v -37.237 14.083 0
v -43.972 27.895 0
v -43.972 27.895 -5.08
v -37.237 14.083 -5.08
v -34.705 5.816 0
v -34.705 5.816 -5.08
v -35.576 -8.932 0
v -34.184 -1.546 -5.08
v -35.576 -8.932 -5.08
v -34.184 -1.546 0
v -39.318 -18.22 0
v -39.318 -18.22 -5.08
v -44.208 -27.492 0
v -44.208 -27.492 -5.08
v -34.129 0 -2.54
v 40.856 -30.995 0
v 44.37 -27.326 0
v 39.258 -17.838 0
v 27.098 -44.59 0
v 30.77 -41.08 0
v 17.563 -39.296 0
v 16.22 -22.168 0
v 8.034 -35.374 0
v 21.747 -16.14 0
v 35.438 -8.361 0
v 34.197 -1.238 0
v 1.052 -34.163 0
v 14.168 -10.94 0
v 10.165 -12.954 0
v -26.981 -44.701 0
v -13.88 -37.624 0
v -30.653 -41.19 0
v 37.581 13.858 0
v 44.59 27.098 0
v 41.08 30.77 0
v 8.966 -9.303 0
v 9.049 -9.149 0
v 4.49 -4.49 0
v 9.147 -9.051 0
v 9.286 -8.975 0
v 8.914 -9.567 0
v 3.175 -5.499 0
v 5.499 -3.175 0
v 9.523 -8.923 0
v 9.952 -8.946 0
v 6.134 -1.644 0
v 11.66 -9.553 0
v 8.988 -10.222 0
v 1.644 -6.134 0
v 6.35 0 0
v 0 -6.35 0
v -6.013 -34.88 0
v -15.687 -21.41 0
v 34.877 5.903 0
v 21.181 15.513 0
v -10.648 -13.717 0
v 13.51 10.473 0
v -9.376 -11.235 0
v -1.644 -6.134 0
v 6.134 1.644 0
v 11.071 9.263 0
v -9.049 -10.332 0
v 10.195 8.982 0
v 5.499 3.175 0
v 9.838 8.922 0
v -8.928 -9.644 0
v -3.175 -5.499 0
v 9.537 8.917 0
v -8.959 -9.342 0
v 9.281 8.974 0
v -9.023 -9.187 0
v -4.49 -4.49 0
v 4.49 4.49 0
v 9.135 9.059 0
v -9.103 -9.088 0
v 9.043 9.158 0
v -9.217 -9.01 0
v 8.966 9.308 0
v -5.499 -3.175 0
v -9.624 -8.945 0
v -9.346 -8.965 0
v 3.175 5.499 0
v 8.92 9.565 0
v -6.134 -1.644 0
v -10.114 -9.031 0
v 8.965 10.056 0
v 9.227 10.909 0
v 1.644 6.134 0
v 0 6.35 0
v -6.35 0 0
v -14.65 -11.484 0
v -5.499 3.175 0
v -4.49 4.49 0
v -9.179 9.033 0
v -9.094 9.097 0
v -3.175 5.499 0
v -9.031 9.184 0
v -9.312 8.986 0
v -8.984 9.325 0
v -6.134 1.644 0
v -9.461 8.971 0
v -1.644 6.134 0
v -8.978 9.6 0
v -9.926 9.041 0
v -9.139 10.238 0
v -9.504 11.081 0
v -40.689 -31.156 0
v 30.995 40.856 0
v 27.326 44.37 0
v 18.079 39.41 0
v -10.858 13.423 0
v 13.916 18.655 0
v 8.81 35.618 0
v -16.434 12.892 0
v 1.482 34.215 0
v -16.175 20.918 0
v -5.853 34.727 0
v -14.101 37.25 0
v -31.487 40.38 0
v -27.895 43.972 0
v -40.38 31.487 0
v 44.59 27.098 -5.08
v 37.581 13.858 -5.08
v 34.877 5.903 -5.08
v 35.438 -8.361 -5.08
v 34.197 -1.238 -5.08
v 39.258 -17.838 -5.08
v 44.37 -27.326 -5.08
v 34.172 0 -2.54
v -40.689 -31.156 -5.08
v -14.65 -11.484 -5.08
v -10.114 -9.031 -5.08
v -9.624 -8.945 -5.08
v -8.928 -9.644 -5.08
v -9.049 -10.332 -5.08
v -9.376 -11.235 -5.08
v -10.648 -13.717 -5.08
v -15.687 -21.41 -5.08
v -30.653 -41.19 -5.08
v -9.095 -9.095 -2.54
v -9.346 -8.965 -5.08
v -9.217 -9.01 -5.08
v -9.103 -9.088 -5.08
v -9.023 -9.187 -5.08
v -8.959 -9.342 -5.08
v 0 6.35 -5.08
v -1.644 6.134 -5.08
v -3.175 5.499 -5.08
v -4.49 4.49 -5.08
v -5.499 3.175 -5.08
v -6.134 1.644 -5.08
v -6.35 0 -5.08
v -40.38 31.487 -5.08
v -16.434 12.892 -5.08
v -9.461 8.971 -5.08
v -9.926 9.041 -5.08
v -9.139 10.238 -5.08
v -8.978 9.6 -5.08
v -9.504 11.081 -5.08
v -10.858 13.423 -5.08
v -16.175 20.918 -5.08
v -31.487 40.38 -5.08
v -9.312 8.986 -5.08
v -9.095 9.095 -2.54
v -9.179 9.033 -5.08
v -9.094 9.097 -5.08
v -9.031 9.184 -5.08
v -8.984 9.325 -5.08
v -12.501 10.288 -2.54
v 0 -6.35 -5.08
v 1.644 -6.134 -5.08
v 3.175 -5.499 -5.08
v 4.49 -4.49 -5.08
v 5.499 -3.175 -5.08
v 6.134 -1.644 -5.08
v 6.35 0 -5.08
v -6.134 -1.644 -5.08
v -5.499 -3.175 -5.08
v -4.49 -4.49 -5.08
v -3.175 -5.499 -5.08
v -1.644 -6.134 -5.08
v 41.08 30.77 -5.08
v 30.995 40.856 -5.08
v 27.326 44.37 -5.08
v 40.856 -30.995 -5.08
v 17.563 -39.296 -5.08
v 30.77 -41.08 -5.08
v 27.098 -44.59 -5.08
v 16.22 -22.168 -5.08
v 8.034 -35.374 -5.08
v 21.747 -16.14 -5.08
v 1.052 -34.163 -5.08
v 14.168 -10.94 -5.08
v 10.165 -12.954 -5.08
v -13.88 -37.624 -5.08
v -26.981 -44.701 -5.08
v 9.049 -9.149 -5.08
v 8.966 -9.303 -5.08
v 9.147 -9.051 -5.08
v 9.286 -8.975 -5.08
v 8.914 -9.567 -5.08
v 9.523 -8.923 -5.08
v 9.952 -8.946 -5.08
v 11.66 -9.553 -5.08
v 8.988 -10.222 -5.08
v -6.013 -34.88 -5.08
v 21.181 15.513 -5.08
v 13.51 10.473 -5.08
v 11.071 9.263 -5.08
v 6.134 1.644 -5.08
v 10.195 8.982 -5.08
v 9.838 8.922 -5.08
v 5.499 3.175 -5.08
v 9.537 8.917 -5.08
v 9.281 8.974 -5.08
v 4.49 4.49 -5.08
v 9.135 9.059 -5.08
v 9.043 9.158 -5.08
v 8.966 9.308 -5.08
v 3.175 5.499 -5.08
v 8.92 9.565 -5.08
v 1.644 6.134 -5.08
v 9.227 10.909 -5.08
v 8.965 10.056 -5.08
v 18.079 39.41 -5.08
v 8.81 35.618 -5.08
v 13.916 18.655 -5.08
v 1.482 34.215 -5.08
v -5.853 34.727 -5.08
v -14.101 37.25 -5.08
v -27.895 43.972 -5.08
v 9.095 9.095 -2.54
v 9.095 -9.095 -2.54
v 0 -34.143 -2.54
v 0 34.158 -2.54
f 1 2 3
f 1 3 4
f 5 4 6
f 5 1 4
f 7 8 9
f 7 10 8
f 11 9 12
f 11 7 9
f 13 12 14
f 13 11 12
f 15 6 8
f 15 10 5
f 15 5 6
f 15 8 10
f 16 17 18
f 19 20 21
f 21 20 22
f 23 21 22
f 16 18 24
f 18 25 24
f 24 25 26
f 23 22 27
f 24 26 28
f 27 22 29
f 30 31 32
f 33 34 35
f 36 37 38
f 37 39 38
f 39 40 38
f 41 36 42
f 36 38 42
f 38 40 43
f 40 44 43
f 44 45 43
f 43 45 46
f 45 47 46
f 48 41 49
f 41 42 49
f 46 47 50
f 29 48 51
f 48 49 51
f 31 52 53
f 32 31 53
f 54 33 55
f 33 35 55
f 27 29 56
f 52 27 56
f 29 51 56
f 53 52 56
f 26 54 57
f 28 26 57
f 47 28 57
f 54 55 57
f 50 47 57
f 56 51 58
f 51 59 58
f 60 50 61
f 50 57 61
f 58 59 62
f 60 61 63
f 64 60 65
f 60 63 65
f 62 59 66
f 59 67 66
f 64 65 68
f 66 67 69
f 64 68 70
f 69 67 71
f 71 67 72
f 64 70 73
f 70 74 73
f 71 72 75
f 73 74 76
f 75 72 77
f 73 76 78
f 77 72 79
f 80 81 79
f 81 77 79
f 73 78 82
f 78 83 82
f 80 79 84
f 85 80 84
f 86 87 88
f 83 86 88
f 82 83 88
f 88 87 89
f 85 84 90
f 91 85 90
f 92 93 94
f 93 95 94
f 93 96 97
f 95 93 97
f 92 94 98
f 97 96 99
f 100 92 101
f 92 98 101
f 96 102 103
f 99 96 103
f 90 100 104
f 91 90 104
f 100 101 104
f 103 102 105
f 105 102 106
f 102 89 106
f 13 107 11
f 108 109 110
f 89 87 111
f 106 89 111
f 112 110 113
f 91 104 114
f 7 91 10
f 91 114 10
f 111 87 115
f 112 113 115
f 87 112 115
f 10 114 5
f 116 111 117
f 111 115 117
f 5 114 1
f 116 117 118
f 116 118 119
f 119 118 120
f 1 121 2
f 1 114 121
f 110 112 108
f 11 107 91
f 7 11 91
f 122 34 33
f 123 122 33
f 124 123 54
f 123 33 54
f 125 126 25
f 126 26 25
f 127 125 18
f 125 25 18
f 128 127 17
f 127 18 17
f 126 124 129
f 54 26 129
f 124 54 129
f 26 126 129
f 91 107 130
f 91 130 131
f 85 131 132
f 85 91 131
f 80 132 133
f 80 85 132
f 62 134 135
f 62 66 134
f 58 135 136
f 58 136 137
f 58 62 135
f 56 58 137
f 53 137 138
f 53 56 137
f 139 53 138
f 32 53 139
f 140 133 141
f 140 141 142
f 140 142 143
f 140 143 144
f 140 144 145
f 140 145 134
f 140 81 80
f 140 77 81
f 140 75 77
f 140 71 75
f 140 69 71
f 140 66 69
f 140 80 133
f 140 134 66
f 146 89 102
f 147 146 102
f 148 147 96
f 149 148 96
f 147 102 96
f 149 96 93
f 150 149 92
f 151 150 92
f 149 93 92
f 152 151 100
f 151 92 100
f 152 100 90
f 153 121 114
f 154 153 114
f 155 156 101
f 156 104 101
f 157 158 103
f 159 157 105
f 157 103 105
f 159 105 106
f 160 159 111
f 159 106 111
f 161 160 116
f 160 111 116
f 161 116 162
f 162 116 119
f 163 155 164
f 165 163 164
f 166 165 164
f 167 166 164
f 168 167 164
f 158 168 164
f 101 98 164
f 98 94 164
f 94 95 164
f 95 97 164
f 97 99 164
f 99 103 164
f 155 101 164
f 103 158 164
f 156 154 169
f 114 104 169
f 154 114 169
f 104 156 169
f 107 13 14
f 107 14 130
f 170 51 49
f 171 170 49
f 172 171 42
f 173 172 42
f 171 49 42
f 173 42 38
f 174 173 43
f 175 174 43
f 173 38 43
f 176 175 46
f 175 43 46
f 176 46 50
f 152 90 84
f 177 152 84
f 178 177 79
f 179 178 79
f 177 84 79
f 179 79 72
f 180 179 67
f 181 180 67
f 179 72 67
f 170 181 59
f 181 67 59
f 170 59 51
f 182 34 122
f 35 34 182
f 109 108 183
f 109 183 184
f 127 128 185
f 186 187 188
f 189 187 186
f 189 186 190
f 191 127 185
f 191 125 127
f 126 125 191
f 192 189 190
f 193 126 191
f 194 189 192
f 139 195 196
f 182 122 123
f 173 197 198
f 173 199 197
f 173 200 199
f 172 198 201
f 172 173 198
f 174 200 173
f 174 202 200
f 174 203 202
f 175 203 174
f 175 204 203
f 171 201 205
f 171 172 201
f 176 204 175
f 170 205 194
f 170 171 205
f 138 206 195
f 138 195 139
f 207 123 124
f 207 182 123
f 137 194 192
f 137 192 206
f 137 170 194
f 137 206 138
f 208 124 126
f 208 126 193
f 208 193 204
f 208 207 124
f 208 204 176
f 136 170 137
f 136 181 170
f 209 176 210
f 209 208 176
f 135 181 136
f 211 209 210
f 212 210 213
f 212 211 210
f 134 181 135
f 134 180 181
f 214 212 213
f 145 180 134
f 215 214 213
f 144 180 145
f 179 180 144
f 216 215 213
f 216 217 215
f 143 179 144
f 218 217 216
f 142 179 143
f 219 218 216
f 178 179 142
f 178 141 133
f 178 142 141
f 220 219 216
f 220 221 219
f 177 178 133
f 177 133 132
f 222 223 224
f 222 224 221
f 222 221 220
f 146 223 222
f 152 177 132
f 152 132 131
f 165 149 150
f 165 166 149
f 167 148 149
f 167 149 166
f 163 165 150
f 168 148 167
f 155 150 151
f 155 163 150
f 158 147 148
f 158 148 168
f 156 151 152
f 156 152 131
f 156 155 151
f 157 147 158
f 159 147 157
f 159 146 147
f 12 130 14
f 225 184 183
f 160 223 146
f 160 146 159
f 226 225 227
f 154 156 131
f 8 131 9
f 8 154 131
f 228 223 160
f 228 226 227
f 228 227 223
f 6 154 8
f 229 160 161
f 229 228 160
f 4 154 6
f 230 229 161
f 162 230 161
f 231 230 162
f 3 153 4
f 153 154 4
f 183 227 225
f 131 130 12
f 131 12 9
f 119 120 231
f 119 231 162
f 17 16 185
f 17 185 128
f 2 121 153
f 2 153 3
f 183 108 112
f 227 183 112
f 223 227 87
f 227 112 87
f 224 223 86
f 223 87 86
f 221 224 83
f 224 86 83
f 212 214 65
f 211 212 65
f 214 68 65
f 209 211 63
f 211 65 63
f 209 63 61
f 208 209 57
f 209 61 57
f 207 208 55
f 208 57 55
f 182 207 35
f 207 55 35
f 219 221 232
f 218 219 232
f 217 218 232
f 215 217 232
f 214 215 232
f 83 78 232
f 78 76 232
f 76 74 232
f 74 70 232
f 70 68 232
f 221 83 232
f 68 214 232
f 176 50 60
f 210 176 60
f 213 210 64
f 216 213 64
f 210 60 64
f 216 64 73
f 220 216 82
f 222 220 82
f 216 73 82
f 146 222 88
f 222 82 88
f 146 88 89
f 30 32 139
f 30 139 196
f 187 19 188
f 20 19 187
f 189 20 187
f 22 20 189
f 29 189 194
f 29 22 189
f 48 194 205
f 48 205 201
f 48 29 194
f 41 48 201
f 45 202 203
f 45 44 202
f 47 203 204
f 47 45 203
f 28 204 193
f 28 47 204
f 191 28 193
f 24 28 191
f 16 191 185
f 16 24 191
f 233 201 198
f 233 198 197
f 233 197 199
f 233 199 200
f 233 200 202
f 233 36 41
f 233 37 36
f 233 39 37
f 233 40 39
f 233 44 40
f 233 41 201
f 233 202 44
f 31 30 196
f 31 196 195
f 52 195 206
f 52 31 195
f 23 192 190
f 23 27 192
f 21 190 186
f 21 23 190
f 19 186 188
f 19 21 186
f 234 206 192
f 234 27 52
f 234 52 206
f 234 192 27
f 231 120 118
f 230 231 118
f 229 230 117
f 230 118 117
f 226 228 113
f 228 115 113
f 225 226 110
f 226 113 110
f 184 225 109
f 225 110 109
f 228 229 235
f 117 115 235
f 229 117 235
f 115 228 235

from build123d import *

# Parameters (mm, degrees)
F2_DEPTH = 5.08
F3_DEPTH = 5.08


with BuildPart() as f2:
    # F1 (on Top) → F2 (new body)
    with BuildSketch(Plane.XY):
        with BuildLine():
            add(Edge.make_bspline(
                [(-40.3796768019, 31.486727974), (-25.4125832668, 19.5130531459), (4.2719382832, -4.2719382832), (-19.5130531459, 25.4125832668), (-31.486727974, 40.3796768019)],
                knots=[0, 0, 0, 0, 0.5, 1, 1, 1, 1], degree=3))
            Line((-40.3796768019, 31.486727974), (-43.9717792504, 27.8946255256))
            add(Edge.make_bspline(
                [(-43.9717792504, 27.8946255256), (-39.0223614388, 18.5744758569), (-29.1485977035, -0.0186111101), (-39.1966306531, -18.3497362141), (-44.207889928, -27.4920251734)],
                knots=[0, 0, 0, 0, 0.5012696216, 1, 1, 1, 1], degree=3))
            Line((-44.207889928, -27.4920251734), (-40.688852268, -31.1557355805))
            add(Edge.make_bspline(
                [(-40.688852268, -31.1557355805), (-25.5161789229, -19.5156604784), (3.9712190003, 4.6498080898), (-18.7967685048, -26.1767940312), (-30.6525350904, -41.1896309485)],
                knots=[0, 0, 0, 0, 0.4995827747, 1, 1, 1, 1], degree=3))
            Line((-30.6525350904, -41.1896309485), (-26.9813712251, -44.7008922424))
            add(Edge.make_bspline(
                [(-26.9813712251, -44.7008922424), (-17.9946084514, -39.4329857114), (-0.010494669, -28.8909659837), (18.0580501184, -39.3550908644), (27.0976414843, -44.5902337071)],
                knots=[0, 0, 0, 0, 0.4997056226, 1, 1, 1, 1], degree=3))
            Line((27.0976414843, -44.5902337071), (30.7701121053, -41.0803391876))
            add(Edge.make_bspline(
                [(30.7701121053, -41.0803391876), (18.791953604, -26.107641061), (-4.1552313798, 4.3732948199), (25.8949419877, -19.0260044621), (40.8564309314, -30.995195617)],
                knots=[0, 0, 0, 0, 0.5001872305, 1, 1, 1, 1], degree=3))
            Line((40.8564309314, -30.995195617), (44.3699422534, -27.3261850978))
            add(Edge.make_bspline(
                [(44.5902337071, 27.0976414843), (39.403270189, 18.0788208761), (29.0172364099, 0.0201290891), (39.2483982347, -18.2036660263), (44.3699422534, -27.3261850978)],
                knots=[0, 0, 0, 0, 0.4994171624, 1, 1, 1, 1], degree=3))
            Line((44.5902337071, 27.0976414843), (41.0803391876, 30.7701121053))
            add(Edge.make_bspline(
                [(30.995195617, 40.8564309314), (19.0260044621, 25.8949419877), (-4.3732948199, -4.1552313798), (26.107641061, 18.791953604), (41.0803391876, 30.7701121053)],
                knots=[0, 0, 0, 0, 0.4998127695, 1, 1, 1, 1], degree=3))
            Line((30.995195617, 40.8564309314), (27.3261850978, 44.3699422534))
            add(Edge.make_bspline(
                [(-27.8946255256, 43.9717792504), (-18.5644448783, 39.0204369591), (0.0328141053, 29.1512395247), (18.2489978621, 39.3085295686), (27.3261850978, 44.3699422534)],
                knots=[0, 0, 0, 0, 0.5016965487, 1, 1, 1, 1], degree=3))
            Line((-27.8946255256, 43.9717792504), (-31.486727974, 40.3796768019))
        make_face()
    extrude(amount=-F2_DEPTH)

    # F0 (on Top) → F3 (cut, through all)
    with BuildSketch(Plane.XY):
        with BuildLine():
            ThreePointArc((0, -6.35), (4.4901280605, -4.4901280605), (6.35, 0))
            ThreePointArc((6.35, 0), (4.4901280605, 4.4901280605), (0, 6.35))
            ThreePointArc((0, 6.35), (-4.4901280605, 4.4901280605), (-6.35, 0))
            ThreePointArc((-6.35, 0), (-4.4901280605, -4.4901280605), (0, -6.35))
        make_face()
    extrude(amount=-F3_DEPTH, mode=Mode.SUBTRACT)


solid = f2.part
